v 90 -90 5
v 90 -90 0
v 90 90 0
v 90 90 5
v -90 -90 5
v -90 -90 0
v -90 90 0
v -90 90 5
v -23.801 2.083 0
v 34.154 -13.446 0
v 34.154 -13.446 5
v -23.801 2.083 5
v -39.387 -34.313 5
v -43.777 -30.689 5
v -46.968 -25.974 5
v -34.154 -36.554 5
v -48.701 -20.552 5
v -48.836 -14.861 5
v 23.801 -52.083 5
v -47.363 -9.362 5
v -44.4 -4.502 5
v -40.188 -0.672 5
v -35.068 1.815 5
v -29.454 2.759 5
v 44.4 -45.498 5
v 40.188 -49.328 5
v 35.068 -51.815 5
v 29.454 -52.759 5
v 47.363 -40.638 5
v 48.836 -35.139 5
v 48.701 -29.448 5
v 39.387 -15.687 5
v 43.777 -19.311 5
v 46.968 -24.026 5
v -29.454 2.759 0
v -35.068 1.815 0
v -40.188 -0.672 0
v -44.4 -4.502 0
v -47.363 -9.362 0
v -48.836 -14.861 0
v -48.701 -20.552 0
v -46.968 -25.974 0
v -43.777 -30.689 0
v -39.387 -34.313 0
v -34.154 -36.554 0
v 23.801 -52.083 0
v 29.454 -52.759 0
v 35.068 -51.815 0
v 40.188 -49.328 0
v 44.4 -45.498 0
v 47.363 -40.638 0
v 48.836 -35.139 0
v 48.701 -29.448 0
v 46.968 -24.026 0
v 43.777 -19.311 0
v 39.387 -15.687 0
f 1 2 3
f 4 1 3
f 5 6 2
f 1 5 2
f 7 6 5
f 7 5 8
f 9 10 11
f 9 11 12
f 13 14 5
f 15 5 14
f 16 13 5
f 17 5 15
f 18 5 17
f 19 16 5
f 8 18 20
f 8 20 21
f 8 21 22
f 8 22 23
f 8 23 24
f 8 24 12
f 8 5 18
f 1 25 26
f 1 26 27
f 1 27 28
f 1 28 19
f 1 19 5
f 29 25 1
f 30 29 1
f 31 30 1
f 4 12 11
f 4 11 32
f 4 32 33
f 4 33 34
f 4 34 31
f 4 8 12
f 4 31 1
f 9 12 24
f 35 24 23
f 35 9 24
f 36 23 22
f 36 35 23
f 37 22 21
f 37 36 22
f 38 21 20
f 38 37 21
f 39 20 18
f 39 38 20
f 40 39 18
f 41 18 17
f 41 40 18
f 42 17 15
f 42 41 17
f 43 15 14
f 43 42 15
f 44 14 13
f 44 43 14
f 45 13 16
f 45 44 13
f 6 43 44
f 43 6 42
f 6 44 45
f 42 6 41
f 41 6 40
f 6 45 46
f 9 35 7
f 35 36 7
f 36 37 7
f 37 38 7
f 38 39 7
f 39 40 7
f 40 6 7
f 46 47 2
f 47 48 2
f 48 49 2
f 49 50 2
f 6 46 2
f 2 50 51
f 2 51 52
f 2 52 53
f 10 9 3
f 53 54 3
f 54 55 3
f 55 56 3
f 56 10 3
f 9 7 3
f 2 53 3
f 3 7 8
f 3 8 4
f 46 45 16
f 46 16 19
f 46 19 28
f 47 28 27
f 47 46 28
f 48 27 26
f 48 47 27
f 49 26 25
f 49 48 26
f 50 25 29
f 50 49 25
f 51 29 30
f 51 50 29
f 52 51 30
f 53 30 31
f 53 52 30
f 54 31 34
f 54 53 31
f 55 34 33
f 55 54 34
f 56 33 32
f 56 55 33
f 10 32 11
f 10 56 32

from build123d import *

# Parameters (mm, degrees)
SKETCH1_W           = 180
SKETCH1_H           = 180
BOSS_EXTRUDE1_DEPTH = 5
CUT_EXTRUDE1_DEPTH  = 128.377392029


with BuildPart() as part:
    # Sketch1 → Boss-Extrude1 (new body)
    with BuildSketch(Plane.XY):
        Rectangle(SKETCH1_W, SKETCH1_H)
    extrude(amount=BOSS_EXTRUDE1_DEPTH)

    # Sketch3 → Cut-Extrude1 (cut, through all)
    with BuildSketch(Plane(origin=(0, 0, 0), x_dir=(-1, 0, 0), z_dir=(0, 0, -1))):
        with BuildLine():
            Line((-34.154155691, -13.446054827), (23.801393887, 2.083087879))
            ThreePointArc((23.801393887, 2.083087879), (48.296291314, -12.059047745), (34.154155691, -36.553945173))
            Line((34.154155691, -36.553945173), (-23.801393887, -52.083087879))
            ThreePointArc((-23.801393887, -52.083087879), (-48.296291314, -37.940952255), (-34.154155691, -13.446054827))
        make_face()
    extrude(amount=-CUT_EXTRUDE1_DEPTH, mode=Mode.SUBTRACT)


solid = part.part
